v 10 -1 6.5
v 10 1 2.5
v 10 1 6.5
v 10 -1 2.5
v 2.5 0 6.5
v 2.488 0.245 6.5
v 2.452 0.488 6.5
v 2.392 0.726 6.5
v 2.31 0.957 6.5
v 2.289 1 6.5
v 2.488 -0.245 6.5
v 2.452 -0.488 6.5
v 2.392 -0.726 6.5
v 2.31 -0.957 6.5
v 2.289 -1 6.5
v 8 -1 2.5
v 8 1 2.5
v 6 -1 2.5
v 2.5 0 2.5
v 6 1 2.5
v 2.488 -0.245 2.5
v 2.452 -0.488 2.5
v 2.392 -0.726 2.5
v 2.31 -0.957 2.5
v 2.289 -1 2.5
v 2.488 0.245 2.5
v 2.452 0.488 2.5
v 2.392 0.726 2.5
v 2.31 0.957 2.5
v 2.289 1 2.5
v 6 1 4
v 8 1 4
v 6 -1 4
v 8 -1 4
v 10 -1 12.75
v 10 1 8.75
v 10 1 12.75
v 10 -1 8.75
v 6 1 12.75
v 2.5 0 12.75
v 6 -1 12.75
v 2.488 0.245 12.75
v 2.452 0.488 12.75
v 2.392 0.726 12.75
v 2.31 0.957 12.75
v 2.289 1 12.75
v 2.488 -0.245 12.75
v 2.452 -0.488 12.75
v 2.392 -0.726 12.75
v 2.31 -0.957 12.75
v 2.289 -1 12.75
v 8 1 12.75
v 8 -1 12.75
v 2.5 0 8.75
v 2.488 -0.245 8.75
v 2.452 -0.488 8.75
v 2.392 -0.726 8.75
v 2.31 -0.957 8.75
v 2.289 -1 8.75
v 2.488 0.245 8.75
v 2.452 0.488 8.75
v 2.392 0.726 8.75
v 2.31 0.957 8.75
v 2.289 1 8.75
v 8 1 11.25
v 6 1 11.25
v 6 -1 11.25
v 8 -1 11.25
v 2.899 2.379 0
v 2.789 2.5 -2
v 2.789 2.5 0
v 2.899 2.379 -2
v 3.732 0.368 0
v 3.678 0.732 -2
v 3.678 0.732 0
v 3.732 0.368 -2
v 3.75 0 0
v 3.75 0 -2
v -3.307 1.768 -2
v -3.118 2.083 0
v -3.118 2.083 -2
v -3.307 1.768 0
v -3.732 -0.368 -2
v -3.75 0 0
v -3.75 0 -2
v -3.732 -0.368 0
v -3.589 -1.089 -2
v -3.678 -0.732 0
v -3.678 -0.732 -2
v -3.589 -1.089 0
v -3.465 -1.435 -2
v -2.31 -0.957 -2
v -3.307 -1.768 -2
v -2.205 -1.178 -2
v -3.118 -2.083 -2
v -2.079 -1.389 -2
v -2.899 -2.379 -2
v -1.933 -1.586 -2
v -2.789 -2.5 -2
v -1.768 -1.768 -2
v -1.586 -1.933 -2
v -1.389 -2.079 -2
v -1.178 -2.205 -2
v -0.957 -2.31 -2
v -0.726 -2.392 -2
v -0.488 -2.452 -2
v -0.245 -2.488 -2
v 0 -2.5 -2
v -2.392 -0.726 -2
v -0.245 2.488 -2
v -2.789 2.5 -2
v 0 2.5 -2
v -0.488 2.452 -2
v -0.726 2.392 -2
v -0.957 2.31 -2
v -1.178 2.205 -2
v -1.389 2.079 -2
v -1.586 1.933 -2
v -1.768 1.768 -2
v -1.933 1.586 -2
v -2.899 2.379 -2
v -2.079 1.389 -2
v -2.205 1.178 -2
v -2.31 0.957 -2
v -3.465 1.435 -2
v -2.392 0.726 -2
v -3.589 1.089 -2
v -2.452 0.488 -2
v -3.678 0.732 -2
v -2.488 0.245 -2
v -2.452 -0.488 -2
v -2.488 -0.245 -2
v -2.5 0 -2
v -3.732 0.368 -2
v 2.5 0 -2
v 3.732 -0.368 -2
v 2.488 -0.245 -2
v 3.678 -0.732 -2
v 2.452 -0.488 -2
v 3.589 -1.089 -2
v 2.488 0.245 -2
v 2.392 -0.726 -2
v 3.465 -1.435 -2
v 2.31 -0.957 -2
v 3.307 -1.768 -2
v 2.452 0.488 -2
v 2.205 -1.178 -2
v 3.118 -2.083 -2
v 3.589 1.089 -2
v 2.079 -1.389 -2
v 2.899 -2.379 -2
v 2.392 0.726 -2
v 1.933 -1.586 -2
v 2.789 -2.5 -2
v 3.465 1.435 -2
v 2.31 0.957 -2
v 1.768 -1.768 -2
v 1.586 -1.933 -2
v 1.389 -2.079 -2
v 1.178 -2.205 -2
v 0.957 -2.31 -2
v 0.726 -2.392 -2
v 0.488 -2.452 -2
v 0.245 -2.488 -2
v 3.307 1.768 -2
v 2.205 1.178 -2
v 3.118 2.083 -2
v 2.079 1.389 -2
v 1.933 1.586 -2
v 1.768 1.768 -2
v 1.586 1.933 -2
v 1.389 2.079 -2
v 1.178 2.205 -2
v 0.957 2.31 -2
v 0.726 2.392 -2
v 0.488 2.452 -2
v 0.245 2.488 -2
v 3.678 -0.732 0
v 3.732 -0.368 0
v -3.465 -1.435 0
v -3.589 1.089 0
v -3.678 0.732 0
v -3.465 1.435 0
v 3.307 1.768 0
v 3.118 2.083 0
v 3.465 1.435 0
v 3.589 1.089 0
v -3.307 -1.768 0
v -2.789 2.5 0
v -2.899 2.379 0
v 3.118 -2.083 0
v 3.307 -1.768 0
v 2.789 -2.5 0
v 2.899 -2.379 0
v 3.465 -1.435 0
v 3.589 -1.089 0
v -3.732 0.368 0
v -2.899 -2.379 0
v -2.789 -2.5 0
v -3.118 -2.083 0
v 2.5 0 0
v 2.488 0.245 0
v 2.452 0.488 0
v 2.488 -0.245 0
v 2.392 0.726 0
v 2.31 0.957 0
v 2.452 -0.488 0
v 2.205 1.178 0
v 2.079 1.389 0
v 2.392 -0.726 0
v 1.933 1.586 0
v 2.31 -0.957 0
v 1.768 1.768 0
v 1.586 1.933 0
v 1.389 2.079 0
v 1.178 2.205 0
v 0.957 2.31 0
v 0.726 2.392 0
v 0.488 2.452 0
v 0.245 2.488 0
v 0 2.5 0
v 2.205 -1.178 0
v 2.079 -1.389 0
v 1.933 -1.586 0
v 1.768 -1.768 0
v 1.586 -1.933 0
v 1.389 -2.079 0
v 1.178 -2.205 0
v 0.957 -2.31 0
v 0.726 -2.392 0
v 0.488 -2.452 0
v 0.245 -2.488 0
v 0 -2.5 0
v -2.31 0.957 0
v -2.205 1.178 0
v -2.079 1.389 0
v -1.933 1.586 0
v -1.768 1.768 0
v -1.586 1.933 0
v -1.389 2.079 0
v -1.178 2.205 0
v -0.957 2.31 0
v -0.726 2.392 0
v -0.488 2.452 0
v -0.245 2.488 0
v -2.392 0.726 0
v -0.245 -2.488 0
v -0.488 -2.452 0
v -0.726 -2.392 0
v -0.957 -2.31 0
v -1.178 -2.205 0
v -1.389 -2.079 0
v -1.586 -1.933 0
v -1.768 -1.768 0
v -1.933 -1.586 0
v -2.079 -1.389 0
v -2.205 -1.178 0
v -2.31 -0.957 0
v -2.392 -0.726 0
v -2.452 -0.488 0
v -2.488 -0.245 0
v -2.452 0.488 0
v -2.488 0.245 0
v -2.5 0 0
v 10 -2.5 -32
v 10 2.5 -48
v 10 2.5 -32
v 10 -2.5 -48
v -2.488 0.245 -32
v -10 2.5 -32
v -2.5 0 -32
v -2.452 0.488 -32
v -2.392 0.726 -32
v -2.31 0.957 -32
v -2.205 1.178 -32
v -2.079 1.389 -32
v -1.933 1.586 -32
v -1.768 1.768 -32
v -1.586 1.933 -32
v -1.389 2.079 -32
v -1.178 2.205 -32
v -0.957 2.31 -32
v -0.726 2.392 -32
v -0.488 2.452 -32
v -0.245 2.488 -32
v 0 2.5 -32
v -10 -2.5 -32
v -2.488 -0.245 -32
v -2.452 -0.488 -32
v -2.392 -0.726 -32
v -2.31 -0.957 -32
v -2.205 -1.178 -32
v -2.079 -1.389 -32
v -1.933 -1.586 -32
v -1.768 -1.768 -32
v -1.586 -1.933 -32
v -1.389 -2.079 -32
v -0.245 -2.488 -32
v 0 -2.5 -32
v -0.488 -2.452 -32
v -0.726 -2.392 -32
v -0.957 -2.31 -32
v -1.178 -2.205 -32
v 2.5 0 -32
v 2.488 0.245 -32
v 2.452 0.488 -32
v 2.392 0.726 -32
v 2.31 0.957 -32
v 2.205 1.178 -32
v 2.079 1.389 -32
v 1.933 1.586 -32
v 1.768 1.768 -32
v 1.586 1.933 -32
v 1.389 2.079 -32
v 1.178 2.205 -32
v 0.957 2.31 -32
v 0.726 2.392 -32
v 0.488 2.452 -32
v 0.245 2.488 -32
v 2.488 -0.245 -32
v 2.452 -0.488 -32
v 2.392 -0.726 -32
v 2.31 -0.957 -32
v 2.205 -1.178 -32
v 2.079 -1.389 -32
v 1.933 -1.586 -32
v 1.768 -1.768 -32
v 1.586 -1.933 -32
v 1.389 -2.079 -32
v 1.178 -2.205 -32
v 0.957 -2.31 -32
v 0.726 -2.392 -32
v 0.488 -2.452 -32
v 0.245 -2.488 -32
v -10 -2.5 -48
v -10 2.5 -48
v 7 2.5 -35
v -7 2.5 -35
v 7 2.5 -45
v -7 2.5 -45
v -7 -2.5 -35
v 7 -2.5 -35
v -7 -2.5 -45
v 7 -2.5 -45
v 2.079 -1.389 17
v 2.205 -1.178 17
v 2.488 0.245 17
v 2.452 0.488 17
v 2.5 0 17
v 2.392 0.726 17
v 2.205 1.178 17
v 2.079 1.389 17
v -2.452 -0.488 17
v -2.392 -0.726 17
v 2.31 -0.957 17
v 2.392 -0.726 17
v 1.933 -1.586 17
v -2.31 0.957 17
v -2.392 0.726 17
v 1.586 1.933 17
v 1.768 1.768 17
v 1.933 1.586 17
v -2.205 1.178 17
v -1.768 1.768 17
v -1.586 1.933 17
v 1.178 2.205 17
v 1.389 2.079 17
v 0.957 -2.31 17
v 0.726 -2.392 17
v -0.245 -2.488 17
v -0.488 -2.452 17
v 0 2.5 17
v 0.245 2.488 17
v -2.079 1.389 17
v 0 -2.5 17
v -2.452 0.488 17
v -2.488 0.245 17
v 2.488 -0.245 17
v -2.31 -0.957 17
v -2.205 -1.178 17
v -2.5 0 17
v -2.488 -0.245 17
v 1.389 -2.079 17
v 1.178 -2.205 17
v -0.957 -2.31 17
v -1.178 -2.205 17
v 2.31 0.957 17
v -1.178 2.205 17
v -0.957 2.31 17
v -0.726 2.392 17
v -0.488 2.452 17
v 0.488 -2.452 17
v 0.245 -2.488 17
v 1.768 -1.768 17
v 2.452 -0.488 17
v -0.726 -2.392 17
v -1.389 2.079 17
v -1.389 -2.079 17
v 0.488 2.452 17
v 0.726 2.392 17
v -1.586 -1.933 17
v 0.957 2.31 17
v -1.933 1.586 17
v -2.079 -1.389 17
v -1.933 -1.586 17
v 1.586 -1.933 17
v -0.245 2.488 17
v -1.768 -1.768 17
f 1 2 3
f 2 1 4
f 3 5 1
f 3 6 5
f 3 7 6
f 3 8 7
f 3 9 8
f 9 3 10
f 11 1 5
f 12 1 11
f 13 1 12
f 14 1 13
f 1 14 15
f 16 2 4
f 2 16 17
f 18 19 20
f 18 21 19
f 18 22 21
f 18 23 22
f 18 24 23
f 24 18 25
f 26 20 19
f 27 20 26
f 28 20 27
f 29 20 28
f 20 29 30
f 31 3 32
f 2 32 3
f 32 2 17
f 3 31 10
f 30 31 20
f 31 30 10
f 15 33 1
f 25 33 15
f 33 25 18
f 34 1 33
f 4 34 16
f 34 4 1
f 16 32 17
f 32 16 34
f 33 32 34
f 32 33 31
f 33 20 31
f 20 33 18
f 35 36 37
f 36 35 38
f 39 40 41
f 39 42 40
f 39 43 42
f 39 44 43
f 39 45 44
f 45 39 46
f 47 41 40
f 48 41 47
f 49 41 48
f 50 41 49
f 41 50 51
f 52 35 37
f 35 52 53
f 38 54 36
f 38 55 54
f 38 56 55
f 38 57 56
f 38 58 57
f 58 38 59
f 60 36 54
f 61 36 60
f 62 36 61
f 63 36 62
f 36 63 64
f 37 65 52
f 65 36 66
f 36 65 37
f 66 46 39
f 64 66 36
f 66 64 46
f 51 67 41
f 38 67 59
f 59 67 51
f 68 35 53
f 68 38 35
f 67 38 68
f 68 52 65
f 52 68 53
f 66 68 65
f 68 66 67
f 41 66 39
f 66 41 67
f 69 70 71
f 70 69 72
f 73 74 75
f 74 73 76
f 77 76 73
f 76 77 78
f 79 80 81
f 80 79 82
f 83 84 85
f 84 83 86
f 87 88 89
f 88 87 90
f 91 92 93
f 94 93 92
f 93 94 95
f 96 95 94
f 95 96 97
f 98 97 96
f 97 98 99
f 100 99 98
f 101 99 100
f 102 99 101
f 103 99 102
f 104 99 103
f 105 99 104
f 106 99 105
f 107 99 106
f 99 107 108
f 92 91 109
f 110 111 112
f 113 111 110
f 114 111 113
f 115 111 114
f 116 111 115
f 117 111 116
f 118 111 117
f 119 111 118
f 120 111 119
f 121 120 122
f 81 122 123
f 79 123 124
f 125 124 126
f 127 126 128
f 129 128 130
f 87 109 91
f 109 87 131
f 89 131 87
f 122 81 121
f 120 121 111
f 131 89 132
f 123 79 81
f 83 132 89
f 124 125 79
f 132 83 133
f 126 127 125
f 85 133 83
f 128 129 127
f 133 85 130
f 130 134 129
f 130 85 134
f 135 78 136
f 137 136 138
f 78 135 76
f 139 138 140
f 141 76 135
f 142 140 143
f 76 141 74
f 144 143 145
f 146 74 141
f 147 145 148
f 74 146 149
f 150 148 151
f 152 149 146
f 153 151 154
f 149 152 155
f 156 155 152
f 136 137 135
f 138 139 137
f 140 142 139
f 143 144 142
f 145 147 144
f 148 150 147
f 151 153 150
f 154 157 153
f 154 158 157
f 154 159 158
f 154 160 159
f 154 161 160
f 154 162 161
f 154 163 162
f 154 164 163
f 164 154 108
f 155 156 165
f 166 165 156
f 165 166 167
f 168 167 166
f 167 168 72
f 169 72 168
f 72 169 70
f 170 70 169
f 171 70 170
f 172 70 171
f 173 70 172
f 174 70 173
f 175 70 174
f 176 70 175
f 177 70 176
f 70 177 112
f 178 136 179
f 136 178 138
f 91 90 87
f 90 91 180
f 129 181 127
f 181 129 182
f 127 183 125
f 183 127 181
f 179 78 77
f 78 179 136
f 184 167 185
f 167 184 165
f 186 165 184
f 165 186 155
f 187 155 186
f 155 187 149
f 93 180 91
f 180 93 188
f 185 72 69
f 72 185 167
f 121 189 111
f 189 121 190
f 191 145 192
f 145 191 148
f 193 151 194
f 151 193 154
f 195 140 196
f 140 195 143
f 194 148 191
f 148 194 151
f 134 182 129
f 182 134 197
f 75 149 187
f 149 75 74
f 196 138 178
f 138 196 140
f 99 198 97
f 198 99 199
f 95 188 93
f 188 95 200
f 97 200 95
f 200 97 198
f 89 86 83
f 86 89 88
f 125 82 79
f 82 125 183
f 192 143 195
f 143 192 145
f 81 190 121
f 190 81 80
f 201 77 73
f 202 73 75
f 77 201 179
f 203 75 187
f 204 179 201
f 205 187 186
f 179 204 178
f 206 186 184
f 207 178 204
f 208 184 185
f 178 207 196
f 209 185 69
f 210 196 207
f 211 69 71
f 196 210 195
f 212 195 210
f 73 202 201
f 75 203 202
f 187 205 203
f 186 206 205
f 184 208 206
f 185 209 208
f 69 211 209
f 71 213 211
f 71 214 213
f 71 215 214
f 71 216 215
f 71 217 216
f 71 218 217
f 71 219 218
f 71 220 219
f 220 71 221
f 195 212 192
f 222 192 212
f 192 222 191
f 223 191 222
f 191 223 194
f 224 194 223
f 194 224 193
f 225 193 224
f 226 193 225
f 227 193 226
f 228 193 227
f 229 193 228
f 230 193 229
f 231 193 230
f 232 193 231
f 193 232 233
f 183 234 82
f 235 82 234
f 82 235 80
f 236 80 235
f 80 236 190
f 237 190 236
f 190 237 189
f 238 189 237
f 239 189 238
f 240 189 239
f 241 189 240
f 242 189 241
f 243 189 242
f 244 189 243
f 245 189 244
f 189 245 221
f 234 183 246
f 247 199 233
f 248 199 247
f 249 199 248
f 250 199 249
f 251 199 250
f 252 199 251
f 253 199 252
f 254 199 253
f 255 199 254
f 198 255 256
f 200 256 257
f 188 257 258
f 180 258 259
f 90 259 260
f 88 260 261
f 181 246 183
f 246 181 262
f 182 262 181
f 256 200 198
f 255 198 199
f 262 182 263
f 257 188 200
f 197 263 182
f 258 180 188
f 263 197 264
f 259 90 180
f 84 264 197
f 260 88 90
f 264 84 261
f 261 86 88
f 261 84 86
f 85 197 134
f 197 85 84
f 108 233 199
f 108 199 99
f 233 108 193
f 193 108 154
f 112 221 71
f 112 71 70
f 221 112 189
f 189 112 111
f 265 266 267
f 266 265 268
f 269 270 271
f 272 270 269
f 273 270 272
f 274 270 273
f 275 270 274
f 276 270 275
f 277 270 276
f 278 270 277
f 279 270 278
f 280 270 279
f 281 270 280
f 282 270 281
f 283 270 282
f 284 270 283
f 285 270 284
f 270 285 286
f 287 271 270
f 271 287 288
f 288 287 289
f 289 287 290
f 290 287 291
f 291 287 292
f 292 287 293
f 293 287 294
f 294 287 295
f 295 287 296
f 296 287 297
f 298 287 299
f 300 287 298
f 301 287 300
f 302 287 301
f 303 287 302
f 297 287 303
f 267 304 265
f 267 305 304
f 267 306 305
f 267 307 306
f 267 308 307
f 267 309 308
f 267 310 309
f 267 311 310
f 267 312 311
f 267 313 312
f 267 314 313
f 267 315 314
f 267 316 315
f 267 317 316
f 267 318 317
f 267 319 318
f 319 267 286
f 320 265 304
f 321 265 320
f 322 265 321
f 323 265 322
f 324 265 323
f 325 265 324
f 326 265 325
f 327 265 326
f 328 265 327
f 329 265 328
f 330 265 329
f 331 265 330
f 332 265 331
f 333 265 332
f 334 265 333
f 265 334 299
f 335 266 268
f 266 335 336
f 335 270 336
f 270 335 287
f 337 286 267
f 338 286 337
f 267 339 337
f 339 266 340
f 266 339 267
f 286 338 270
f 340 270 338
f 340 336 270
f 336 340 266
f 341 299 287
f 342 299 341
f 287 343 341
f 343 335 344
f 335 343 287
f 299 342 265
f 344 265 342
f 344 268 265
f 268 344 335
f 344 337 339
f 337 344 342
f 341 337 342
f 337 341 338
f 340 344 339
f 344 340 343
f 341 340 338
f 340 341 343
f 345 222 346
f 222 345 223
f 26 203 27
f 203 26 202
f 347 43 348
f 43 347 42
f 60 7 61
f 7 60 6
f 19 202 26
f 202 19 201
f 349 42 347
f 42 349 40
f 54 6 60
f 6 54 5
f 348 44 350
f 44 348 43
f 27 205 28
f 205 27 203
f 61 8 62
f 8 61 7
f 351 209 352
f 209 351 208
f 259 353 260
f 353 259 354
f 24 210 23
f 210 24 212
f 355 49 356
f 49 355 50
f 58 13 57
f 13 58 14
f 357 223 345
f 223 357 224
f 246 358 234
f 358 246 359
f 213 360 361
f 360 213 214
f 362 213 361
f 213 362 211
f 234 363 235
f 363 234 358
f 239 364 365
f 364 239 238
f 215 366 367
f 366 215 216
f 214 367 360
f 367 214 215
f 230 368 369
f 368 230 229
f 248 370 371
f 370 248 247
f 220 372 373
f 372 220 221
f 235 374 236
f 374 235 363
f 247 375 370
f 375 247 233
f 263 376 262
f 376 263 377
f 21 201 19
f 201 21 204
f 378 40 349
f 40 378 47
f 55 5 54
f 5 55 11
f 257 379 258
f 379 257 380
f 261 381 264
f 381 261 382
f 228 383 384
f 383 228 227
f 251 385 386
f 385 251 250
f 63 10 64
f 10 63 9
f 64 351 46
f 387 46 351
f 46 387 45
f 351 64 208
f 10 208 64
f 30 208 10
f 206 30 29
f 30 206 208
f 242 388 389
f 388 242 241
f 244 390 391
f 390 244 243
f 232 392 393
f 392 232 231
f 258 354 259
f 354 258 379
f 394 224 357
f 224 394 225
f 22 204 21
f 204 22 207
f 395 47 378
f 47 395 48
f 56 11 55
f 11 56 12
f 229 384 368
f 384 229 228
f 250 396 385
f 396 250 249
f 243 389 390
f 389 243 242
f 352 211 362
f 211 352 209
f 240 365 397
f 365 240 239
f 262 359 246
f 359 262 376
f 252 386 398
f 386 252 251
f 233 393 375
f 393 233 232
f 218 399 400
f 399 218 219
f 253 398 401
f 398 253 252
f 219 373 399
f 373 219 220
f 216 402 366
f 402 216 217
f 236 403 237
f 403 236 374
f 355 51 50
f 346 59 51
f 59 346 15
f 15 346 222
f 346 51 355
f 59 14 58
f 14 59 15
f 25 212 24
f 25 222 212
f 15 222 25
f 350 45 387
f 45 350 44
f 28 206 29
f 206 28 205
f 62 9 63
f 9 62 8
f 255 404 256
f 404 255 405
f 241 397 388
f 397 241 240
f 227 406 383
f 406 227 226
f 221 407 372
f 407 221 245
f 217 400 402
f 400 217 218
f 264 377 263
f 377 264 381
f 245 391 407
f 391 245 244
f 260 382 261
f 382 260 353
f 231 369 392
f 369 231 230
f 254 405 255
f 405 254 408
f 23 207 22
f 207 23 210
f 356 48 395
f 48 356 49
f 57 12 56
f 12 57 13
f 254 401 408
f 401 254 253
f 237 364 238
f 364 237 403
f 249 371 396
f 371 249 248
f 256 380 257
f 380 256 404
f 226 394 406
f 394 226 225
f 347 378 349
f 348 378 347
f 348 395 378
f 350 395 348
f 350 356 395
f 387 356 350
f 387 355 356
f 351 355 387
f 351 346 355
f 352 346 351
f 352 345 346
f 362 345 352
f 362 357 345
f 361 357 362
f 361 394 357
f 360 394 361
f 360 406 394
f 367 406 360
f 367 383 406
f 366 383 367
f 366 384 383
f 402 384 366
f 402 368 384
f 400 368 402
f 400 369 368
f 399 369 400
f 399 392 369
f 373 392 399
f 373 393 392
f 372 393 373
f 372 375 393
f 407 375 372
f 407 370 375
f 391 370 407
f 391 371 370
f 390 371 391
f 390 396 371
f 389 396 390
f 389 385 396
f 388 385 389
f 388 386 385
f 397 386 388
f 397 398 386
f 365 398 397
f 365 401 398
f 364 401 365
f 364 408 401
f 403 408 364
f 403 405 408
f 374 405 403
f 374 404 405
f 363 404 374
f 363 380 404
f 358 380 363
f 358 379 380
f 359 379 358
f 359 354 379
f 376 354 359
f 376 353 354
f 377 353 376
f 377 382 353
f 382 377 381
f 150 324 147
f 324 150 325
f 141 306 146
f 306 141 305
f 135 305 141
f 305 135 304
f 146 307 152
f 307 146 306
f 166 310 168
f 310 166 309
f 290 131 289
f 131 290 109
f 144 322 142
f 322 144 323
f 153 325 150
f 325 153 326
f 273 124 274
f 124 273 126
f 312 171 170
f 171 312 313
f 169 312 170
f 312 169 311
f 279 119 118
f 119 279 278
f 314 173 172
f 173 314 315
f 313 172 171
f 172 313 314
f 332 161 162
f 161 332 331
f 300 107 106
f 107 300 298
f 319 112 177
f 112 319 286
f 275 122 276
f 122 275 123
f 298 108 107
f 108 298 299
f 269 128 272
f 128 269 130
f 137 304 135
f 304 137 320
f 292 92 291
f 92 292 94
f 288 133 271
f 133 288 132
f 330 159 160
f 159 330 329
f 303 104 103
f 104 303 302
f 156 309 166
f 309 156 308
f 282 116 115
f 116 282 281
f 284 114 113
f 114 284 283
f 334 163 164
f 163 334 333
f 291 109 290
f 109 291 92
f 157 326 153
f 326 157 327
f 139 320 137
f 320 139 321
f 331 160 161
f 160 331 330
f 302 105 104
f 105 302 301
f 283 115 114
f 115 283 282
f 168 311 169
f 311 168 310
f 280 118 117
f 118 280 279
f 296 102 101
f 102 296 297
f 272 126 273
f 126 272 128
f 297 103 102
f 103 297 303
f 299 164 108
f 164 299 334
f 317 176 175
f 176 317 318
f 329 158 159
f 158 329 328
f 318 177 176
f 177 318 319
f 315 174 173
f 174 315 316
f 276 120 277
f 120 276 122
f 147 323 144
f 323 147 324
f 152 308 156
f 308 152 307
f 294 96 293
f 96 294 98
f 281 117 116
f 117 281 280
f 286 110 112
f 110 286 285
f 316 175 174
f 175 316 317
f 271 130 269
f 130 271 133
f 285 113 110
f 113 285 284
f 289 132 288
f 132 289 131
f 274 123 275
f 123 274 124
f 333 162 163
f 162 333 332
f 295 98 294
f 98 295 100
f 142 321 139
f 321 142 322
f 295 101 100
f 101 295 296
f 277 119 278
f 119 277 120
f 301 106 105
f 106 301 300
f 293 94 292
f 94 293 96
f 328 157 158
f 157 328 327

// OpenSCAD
outer_shaft_d = 5;
outer_shaft_l = 17; // 18

ring_d = 7.5;
ring_t = 2;

main_shaft_d = 5;
main_shaft_l = 30;

key_handle_t = 5; //3;
key_handle_w = 20;
key_handle_h = 16;

tooth_t = 2.5 - .5;
tooth_h = 7.5;
tooth_len = 4;
tooth_mark_pos = 3.5;
tooth_mark_h = 2;
tooth_mark_d = 1.5;

tooth_a_pos = 2.5;
tooth_b_pos = 8.75; // should be: 8.5 but is actually something like 8.8


$fn = 64; // 64

module tooth(side=0, start) {
    mark_z = (side == 0) ? 0 : (tooth_len-tooth_mark_d);
    translate([0,-tooth_t/2,start])
    difference() {
        cube([tooth_h+outer_shaft_d/2, tooth_t, tooth_len]);
        
        translate([tooth_mark_pos+outer_shaft_d/2,0,mark_z])
        cube([tooth_mark_h, tooth_t, tooth_mark_d]);
    }
    
}

// teeth
tooth(0, tooth_a_pos);
tooth(1, tooth_b_pos);

// outer shaft
cylinder(d=outer_shaft_d, h=outer_shaft_l);
// ring, minus inconvenience
translate([0,0,-ring_t])
    difference() {
        cylinder(d=ring_d, h=ring_t);
        translate([-ring_d/2, -ring_d/2, 0])
            cube([ring_d,
                  (ring_d-outer_shaft_d)/2, ring_t]);
        translate([-ring_d/2, outer_shaft_d/2, 0])
            cube([ring_d,
                  (ring_d-outer_shaft_d)/2, ring_t]);
    }


// main shaft
translate([0,0,-main_shaft_l-ring_t])
    cylinder(d=main_shaft_d, h=main_shaft_l);
// key handle
translate([-key_handle_w/2,
           -key_handle_t/2,
           -main_shaft_l-ring_t-key_handle_h])
    difference(){
        cube([key_handle_w, key_handle_t, key_handle_h]);
        translate([3, 0, 3])
        cube([key_handle_w-6,
              key_handle_t,
              key_handle_h-6]);
    }
